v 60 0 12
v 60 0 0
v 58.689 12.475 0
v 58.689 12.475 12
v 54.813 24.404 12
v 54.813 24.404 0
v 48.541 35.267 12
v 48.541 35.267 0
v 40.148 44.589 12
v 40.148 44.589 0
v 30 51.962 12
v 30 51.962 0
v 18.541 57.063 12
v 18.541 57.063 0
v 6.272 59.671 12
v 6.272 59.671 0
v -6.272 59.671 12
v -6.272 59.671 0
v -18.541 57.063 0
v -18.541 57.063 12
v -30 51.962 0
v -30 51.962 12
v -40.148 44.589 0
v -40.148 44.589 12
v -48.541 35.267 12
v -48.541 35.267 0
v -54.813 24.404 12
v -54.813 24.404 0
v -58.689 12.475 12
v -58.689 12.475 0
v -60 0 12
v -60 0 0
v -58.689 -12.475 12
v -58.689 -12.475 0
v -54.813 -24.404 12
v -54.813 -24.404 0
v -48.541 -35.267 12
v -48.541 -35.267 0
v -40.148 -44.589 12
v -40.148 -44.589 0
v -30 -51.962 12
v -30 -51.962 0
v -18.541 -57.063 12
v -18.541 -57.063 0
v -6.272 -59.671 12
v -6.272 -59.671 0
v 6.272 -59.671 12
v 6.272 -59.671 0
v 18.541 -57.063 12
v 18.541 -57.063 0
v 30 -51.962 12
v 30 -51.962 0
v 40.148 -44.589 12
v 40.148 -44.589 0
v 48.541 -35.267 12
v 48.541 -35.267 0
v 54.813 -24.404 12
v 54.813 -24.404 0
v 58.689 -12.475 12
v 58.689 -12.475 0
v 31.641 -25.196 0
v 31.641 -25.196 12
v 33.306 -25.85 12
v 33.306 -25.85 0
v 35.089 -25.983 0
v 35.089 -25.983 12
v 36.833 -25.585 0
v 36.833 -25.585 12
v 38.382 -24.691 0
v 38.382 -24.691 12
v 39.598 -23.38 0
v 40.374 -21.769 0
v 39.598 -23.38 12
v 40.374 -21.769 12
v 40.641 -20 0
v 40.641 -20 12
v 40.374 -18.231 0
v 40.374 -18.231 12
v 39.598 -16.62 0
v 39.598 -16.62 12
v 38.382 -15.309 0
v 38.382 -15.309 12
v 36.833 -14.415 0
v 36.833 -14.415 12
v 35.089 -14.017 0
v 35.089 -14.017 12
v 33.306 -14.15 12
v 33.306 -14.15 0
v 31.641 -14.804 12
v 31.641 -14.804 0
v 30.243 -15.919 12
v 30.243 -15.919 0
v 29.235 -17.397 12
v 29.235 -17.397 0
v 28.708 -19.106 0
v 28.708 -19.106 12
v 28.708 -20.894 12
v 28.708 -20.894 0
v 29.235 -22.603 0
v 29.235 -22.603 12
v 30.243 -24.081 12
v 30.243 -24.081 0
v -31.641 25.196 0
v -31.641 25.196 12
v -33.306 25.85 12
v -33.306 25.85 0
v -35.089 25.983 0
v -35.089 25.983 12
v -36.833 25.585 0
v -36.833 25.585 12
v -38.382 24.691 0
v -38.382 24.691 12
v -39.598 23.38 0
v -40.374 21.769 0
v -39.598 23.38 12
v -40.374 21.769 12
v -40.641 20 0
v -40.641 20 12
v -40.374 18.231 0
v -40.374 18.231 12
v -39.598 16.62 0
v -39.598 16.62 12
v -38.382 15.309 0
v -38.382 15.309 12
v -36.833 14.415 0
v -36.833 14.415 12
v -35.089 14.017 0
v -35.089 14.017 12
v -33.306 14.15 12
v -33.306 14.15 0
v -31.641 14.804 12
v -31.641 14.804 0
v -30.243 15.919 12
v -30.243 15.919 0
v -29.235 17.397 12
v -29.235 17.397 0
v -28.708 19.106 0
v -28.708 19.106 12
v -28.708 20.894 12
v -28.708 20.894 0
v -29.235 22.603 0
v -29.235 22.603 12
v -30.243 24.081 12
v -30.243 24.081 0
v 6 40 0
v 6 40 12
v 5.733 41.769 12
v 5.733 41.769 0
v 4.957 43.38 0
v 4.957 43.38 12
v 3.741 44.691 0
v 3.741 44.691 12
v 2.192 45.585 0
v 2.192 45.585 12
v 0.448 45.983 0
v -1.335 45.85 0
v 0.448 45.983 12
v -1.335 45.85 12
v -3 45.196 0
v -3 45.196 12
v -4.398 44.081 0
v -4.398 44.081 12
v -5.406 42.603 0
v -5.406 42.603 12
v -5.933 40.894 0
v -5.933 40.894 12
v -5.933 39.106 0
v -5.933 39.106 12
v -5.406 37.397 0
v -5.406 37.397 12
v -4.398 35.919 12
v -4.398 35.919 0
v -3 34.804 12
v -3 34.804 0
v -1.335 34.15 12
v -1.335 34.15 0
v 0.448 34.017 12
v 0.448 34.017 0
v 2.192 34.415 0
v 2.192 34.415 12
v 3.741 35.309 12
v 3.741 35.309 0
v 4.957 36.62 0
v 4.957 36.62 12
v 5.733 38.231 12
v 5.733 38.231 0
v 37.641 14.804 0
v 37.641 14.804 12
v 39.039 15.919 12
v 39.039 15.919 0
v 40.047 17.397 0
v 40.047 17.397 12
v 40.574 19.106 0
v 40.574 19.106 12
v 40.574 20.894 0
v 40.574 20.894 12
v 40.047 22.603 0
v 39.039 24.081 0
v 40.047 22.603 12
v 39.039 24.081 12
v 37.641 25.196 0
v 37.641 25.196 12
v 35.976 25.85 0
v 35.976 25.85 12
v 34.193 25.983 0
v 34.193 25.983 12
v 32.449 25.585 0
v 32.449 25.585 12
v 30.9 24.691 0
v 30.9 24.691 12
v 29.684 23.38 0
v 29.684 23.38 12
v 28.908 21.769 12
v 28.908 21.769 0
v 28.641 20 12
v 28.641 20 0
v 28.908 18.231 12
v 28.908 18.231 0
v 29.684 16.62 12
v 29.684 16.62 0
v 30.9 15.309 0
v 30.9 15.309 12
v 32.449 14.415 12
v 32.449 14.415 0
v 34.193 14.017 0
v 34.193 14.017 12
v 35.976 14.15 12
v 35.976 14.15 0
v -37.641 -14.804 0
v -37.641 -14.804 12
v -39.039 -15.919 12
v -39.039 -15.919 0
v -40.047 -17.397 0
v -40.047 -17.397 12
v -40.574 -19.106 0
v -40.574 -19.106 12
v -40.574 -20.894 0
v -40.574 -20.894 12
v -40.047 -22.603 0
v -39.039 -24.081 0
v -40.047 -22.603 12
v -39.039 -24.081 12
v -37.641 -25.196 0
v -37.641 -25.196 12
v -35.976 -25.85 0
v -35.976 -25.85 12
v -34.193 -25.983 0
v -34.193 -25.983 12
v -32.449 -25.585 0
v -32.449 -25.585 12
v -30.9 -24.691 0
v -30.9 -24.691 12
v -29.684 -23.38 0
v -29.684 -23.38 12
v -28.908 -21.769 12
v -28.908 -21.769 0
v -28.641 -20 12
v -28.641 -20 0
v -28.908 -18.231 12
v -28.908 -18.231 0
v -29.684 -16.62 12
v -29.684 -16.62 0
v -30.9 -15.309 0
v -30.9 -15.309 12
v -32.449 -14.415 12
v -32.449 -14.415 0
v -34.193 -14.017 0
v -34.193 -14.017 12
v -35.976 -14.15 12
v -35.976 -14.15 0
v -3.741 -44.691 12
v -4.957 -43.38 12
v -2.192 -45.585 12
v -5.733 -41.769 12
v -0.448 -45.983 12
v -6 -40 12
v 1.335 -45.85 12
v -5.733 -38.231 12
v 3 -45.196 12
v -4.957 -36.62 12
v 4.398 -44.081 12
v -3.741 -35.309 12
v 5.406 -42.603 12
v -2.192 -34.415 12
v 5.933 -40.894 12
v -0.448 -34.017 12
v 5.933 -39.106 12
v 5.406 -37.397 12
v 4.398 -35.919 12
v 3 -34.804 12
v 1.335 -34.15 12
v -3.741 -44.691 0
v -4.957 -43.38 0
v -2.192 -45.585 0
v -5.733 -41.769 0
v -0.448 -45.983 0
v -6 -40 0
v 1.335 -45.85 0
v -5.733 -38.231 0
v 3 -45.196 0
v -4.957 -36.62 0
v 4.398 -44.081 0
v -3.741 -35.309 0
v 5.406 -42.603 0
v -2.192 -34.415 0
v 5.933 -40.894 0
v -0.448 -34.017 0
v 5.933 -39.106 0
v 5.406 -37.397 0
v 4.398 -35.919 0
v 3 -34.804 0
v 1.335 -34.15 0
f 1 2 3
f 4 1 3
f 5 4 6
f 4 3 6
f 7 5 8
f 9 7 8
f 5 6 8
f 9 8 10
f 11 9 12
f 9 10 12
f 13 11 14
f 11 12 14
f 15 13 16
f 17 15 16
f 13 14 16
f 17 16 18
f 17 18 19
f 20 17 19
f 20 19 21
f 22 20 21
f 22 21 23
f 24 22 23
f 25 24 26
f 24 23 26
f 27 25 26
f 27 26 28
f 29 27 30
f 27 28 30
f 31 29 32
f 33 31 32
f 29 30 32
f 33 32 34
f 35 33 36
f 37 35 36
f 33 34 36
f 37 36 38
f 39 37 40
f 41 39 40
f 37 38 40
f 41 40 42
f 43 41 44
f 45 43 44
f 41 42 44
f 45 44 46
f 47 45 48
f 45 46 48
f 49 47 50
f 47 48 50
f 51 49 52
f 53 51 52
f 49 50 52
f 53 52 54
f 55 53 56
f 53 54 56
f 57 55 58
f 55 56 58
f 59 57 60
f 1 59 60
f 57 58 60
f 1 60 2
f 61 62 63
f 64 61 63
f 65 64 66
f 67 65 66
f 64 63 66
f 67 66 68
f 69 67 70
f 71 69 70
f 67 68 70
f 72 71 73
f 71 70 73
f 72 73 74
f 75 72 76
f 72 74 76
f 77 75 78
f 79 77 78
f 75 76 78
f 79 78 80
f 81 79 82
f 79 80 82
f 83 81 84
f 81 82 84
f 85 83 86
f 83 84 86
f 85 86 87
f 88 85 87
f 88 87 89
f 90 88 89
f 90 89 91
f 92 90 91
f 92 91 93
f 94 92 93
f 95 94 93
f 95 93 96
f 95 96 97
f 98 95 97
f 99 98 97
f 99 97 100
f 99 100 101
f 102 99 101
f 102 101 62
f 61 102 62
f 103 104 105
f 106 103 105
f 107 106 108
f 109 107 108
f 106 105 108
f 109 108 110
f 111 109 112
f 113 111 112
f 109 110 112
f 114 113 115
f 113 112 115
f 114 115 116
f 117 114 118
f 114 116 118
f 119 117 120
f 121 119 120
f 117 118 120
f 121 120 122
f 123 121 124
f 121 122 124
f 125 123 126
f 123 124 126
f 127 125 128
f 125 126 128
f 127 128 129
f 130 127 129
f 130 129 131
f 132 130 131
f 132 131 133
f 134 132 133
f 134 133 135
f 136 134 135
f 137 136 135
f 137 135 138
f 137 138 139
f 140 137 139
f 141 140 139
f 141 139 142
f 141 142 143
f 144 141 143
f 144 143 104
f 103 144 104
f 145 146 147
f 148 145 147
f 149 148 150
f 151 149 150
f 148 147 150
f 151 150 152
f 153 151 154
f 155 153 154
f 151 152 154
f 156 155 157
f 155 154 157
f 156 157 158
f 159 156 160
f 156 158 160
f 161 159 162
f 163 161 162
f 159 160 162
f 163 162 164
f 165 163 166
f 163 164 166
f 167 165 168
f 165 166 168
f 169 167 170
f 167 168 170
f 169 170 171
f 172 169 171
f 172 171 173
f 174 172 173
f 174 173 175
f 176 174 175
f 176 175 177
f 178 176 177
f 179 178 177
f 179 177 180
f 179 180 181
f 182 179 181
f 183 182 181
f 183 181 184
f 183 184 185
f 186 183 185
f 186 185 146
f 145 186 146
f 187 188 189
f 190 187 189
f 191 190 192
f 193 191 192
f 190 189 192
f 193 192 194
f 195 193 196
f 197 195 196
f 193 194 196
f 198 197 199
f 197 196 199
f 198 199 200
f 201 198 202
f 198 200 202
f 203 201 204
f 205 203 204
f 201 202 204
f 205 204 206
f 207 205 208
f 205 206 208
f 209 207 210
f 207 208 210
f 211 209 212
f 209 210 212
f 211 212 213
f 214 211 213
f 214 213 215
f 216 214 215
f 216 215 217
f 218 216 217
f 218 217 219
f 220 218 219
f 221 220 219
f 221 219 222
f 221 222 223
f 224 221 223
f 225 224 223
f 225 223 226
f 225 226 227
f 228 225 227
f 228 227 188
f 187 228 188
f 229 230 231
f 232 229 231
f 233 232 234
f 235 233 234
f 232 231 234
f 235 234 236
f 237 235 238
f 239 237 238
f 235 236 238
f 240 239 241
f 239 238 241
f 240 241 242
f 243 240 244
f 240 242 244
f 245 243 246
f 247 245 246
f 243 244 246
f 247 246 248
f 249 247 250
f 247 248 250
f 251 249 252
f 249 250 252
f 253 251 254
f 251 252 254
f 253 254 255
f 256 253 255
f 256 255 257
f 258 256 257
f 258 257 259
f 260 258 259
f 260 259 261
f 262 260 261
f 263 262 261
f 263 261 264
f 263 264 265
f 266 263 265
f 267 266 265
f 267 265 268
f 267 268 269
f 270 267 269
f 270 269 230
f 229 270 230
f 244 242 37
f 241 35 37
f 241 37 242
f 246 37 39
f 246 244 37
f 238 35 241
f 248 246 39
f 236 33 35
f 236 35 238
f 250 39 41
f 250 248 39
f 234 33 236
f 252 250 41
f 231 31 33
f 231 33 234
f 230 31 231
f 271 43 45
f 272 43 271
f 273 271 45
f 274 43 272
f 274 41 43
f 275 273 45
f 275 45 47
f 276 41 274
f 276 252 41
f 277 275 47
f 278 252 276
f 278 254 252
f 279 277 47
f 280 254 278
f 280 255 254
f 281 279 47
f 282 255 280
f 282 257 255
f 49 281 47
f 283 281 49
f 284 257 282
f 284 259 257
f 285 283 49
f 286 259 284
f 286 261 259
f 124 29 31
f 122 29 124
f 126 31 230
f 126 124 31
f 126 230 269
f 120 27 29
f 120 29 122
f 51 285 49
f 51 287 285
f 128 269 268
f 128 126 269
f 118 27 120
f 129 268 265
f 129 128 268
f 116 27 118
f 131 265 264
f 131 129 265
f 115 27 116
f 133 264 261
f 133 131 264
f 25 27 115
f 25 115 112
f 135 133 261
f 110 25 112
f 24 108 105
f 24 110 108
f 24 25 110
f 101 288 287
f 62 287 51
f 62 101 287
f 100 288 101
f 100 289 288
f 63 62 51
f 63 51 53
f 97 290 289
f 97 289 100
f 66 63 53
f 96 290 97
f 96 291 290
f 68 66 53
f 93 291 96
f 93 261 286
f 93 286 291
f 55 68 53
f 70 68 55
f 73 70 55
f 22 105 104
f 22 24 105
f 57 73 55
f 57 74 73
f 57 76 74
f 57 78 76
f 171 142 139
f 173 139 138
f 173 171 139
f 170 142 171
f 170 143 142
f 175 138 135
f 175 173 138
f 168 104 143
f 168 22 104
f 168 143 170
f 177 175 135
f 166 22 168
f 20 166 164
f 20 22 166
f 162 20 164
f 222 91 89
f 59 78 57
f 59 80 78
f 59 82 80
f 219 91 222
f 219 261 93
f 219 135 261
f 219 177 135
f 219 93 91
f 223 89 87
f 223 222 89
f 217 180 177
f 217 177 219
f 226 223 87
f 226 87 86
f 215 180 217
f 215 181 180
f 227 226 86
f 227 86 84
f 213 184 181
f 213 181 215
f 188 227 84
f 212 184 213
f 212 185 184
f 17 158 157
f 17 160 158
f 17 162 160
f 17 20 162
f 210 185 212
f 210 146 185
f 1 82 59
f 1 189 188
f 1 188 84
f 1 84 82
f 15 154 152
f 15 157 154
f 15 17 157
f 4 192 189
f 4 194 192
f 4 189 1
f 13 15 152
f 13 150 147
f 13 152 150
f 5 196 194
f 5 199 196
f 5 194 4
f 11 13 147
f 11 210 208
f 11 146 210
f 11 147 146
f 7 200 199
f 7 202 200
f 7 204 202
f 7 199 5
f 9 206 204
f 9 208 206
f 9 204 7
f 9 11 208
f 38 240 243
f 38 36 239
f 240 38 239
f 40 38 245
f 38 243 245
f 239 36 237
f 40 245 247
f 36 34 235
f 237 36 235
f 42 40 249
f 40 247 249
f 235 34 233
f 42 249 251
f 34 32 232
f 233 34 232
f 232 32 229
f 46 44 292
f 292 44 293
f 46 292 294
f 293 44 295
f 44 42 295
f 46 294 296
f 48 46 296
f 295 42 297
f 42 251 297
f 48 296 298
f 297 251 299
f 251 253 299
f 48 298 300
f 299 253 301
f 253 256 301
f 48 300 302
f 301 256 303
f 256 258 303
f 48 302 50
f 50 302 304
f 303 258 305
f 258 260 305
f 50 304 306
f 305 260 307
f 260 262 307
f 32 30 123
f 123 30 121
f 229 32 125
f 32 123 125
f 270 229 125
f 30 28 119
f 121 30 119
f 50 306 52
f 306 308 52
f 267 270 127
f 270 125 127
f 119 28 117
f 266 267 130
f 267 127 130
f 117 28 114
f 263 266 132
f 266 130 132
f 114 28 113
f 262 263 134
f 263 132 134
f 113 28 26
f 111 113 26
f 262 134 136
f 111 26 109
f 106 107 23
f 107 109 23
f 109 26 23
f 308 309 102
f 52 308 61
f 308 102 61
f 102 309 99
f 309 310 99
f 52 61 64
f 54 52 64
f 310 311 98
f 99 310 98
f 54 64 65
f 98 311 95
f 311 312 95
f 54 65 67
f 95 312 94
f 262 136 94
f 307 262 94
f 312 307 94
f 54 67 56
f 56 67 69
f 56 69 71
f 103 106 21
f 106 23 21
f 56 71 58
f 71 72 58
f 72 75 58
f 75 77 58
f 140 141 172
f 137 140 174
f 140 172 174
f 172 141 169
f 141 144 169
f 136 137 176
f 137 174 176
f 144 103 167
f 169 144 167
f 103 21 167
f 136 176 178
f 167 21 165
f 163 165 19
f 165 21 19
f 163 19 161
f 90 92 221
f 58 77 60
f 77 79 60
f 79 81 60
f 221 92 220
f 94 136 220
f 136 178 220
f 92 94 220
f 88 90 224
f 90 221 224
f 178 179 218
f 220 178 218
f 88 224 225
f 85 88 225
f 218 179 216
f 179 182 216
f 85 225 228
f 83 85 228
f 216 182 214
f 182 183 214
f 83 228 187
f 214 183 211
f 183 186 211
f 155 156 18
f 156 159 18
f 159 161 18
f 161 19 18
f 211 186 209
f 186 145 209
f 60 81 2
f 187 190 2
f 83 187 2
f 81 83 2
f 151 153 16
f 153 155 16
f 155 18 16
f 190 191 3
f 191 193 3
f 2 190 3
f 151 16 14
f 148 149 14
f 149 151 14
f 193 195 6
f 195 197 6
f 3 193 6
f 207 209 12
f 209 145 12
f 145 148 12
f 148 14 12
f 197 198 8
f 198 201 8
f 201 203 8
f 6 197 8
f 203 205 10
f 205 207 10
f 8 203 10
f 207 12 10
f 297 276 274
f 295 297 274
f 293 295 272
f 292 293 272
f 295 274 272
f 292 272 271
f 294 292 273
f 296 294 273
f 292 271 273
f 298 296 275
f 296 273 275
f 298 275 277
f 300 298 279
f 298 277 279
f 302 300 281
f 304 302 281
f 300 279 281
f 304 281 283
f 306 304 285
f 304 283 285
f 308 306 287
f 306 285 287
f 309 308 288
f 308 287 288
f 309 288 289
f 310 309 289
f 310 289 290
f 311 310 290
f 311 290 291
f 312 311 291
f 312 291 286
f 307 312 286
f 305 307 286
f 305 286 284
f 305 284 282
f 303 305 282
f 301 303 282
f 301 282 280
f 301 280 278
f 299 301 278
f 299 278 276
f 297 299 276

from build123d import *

# Parameters (mm, degrees)
F2_R            = 60
F3_DEPTH        = 12
F4_R            = 6
F5_DEPTH        = 12.001
F5_COPIES_COUNT = 6


# Not quite as in the source:
# - a pattern or mirror of a feature is missing from the dataset's text; its kind, count and spacing are read off the source's solid


with BuildPart() as f3:
    # F2 (on Top) → F3 (new body)
    with BuildSketch(Plane.XY):
        Circle(F2_R)
    extrude(amount=F3_DEPTH)

    # F4 (on face) → F5 (cut, through all)
    with BuildSketch(Plane.XY.offset(12)):
        with Locations((0, 40)):
            Circle(F4_R)
    f5 = extrude(amount=-F5_DEPTH, mode=Mode.SUBTRACT)

    # F5_copies: F5 ×6 about axis
    f5_copies_axis = Axis((0, 0, 0), (0, 0, 1))
    for i in range(1, F5_COPIES_COUNT):
        add(f5.rotate(f5_copies_axis, i * 360 / F5_COPIES_COUNT), mode=Mode.SUBTRACT)


solid = f3.part
